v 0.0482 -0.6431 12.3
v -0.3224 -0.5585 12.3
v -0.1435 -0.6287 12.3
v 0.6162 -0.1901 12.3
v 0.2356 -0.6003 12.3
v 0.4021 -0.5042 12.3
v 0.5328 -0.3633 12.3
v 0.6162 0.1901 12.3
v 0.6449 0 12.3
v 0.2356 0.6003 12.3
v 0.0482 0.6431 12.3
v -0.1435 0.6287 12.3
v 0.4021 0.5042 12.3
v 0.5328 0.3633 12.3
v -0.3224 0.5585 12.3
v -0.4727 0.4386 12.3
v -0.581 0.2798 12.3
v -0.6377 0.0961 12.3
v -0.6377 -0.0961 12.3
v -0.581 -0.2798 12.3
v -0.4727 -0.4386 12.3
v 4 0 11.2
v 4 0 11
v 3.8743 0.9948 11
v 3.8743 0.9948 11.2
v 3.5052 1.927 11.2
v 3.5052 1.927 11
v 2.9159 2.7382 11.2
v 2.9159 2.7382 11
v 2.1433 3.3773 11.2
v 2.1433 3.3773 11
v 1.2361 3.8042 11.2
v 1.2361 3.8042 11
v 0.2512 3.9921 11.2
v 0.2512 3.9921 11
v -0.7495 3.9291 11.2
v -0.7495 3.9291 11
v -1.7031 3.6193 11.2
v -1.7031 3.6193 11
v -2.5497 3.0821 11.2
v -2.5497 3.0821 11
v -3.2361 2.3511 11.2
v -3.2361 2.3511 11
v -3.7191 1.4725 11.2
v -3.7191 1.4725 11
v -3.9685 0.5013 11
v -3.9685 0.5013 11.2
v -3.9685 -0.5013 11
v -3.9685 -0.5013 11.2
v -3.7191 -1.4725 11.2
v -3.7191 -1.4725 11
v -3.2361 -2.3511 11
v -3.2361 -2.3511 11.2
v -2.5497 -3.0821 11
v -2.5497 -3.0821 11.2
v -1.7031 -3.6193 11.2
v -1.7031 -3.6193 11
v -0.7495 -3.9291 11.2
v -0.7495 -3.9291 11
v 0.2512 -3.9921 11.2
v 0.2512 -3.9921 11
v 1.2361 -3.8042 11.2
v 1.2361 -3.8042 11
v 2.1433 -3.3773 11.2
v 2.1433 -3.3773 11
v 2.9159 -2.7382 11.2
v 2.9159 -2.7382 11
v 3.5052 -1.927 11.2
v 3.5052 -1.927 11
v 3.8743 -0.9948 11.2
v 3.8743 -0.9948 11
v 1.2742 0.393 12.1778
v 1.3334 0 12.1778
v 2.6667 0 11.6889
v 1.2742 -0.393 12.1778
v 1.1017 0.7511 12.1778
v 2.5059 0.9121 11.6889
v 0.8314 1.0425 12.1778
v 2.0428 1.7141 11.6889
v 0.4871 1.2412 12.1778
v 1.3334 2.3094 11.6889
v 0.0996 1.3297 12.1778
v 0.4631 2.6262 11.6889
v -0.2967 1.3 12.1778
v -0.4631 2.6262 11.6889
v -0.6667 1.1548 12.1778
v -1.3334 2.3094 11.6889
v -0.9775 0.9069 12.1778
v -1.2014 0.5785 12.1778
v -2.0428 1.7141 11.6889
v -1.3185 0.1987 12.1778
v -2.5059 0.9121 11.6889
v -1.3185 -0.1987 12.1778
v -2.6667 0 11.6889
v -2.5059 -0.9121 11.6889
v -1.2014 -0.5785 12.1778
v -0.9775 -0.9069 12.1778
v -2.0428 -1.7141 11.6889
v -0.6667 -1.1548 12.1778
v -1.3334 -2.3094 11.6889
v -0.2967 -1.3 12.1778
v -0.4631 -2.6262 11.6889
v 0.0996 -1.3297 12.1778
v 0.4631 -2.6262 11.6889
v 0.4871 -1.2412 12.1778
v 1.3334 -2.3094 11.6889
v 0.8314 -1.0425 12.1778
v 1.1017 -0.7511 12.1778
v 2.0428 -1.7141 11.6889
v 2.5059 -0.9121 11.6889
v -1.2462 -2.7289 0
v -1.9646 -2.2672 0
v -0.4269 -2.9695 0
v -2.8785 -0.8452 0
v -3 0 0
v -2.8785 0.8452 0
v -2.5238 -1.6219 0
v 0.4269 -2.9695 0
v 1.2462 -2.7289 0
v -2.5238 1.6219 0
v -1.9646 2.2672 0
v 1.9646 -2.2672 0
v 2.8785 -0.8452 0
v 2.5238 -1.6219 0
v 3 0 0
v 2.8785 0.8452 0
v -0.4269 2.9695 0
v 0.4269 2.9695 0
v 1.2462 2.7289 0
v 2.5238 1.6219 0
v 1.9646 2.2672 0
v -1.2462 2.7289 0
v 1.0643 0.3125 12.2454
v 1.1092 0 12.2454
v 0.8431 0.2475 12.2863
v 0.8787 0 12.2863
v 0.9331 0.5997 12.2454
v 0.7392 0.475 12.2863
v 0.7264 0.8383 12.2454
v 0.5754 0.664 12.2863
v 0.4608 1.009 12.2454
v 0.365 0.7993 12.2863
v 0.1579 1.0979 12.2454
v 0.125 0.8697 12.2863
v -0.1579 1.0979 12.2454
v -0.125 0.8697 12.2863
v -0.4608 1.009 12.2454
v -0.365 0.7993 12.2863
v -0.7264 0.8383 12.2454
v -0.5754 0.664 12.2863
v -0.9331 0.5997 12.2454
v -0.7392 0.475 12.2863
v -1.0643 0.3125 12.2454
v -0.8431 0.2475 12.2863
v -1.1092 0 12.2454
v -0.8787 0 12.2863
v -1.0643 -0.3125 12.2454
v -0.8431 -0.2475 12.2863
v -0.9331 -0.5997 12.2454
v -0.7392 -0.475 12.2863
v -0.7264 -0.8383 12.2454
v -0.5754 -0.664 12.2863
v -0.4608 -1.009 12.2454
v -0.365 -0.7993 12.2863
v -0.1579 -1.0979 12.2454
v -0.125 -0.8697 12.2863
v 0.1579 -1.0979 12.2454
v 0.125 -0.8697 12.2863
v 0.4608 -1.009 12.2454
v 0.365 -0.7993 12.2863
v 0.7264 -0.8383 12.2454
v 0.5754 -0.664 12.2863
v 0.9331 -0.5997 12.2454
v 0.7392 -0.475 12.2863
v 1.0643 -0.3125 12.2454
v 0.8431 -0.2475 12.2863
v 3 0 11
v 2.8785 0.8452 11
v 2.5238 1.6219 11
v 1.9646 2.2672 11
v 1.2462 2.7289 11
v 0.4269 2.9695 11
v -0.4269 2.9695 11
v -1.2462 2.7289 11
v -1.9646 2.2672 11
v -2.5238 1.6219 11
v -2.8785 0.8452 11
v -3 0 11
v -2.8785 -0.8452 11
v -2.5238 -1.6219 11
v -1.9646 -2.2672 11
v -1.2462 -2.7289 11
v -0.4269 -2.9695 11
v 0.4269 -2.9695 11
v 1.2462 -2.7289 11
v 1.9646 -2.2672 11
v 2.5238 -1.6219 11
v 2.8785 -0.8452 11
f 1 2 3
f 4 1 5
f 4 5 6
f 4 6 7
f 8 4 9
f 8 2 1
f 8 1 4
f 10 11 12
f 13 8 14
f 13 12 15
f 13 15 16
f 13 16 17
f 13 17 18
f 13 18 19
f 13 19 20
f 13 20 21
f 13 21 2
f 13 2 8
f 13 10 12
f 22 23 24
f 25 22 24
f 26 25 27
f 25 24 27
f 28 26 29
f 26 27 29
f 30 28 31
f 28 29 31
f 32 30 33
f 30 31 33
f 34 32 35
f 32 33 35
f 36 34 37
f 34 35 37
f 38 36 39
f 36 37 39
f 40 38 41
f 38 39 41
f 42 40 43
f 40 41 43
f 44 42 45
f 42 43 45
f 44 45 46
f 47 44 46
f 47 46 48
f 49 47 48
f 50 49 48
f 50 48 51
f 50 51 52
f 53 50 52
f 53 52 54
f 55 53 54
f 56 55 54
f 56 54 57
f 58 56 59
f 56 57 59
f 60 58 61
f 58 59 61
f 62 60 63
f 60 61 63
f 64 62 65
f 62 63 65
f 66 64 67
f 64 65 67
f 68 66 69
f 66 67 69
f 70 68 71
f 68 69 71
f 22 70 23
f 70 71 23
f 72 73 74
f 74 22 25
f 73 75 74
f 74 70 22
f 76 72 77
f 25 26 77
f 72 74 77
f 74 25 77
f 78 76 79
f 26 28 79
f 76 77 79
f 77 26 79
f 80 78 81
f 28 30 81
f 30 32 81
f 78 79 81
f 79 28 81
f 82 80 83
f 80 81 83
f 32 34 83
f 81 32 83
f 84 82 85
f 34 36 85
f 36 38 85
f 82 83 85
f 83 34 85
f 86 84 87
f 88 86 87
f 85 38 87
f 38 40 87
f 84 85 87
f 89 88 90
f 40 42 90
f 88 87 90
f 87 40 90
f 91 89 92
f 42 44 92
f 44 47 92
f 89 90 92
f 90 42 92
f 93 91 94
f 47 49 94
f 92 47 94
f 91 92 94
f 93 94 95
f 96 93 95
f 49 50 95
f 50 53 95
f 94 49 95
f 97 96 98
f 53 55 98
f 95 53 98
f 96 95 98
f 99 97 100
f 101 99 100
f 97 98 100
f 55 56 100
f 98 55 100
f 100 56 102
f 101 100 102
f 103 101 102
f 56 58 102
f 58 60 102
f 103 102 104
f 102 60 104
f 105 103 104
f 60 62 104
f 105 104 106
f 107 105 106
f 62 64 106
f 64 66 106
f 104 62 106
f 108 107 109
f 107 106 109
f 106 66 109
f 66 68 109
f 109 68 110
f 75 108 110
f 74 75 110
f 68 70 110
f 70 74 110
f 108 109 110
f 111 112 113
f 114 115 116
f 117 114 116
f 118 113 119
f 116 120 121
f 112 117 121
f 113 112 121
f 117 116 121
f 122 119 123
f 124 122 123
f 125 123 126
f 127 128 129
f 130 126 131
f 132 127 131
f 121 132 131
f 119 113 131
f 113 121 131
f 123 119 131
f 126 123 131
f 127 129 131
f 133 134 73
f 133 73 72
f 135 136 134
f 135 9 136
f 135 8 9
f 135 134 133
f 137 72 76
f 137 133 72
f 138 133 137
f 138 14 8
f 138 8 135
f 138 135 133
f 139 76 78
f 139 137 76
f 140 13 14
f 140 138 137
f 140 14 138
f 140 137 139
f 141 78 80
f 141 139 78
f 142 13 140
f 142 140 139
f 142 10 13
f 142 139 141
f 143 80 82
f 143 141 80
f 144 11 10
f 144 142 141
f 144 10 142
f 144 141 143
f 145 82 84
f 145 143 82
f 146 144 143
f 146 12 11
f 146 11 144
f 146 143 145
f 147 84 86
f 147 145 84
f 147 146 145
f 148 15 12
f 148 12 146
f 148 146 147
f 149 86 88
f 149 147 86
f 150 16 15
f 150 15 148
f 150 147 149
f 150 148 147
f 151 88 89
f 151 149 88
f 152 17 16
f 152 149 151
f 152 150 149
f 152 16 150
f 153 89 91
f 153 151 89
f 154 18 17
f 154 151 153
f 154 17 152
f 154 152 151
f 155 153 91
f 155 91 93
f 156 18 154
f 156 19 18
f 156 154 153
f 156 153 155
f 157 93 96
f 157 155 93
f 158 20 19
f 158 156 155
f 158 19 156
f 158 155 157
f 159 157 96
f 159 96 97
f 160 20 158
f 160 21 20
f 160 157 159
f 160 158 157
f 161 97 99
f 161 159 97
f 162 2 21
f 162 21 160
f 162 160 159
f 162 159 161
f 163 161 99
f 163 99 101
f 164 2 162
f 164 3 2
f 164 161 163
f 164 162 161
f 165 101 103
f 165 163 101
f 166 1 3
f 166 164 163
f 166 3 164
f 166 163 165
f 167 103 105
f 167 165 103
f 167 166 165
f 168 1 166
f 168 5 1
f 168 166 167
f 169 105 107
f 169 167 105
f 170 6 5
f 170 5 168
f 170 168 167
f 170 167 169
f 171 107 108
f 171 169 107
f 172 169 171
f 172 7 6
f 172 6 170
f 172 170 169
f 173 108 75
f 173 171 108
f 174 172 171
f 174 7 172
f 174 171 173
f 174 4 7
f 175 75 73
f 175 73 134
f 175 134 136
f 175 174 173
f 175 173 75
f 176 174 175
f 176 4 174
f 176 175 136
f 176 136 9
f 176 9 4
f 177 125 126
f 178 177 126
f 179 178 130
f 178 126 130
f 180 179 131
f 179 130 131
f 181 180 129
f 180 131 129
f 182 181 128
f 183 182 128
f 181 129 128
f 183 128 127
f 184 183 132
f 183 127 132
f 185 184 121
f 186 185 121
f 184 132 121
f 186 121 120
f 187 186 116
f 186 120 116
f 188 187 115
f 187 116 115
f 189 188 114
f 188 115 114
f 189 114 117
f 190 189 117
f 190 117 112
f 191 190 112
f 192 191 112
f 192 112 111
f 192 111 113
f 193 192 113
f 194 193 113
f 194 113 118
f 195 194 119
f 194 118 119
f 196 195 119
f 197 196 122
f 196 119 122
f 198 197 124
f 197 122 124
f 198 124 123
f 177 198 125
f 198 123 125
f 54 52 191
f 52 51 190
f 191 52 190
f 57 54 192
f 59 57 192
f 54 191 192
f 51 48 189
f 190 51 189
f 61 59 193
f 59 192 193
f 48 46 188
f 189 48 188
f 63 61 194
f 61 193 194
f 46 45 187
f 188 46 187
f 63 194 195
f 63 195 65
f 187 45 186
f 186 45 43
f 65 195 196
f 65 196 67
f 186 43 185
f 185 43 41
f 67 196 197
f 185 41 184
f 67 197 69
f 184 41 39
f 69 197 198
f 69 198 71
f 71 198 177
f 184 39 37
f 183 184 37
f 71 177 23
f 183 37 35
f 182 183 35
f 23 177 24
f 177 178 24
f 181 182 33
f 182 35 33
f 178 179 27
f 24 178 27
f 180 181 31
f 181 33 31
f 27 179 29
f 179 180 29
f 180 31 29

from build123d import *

# Parameters (mm, degrees)
F0_R     = 3
F1_DEPTH = 11
F2_R     = 4
F3_DEPTH = 1.3
F4_SIZE2 = 1.1
F4_SIZE  = 3
F5_R     = 2


with BuildPart() as f1:
    # F0 (on Top) → F1 (new body)
    with BuildSketch(Plane.XY):
        Circle(F0_R)
    extrude(amount=F1_DEPTH)

    # F2 (on face) → F3 (join)
    with BuildSketch(Plane.XY.offset(11)):
        Circle(F2_R)
    extrude(amount=F3_DEPTH)

    # F4
    f4_edges = [f1.edges().sort_by_distance(p)[0] for p in [
        (-4, 0, 12.3),
    ]]
    f4_side = f1.faces().sort_by_distance((0, 0, 12.3))[0]
    chamfer(f4_edges, length=F4_SIZE, length2=F4_SIZE2, reference=f4_side)

    # F5
    f5_edges = [f1.edges().sort_by_distance(p)[0] for p in [
        (-1, 0, 12.3),
    ]]
    fillet(f5_edges, radius=F5_R)


solid = f1.part
